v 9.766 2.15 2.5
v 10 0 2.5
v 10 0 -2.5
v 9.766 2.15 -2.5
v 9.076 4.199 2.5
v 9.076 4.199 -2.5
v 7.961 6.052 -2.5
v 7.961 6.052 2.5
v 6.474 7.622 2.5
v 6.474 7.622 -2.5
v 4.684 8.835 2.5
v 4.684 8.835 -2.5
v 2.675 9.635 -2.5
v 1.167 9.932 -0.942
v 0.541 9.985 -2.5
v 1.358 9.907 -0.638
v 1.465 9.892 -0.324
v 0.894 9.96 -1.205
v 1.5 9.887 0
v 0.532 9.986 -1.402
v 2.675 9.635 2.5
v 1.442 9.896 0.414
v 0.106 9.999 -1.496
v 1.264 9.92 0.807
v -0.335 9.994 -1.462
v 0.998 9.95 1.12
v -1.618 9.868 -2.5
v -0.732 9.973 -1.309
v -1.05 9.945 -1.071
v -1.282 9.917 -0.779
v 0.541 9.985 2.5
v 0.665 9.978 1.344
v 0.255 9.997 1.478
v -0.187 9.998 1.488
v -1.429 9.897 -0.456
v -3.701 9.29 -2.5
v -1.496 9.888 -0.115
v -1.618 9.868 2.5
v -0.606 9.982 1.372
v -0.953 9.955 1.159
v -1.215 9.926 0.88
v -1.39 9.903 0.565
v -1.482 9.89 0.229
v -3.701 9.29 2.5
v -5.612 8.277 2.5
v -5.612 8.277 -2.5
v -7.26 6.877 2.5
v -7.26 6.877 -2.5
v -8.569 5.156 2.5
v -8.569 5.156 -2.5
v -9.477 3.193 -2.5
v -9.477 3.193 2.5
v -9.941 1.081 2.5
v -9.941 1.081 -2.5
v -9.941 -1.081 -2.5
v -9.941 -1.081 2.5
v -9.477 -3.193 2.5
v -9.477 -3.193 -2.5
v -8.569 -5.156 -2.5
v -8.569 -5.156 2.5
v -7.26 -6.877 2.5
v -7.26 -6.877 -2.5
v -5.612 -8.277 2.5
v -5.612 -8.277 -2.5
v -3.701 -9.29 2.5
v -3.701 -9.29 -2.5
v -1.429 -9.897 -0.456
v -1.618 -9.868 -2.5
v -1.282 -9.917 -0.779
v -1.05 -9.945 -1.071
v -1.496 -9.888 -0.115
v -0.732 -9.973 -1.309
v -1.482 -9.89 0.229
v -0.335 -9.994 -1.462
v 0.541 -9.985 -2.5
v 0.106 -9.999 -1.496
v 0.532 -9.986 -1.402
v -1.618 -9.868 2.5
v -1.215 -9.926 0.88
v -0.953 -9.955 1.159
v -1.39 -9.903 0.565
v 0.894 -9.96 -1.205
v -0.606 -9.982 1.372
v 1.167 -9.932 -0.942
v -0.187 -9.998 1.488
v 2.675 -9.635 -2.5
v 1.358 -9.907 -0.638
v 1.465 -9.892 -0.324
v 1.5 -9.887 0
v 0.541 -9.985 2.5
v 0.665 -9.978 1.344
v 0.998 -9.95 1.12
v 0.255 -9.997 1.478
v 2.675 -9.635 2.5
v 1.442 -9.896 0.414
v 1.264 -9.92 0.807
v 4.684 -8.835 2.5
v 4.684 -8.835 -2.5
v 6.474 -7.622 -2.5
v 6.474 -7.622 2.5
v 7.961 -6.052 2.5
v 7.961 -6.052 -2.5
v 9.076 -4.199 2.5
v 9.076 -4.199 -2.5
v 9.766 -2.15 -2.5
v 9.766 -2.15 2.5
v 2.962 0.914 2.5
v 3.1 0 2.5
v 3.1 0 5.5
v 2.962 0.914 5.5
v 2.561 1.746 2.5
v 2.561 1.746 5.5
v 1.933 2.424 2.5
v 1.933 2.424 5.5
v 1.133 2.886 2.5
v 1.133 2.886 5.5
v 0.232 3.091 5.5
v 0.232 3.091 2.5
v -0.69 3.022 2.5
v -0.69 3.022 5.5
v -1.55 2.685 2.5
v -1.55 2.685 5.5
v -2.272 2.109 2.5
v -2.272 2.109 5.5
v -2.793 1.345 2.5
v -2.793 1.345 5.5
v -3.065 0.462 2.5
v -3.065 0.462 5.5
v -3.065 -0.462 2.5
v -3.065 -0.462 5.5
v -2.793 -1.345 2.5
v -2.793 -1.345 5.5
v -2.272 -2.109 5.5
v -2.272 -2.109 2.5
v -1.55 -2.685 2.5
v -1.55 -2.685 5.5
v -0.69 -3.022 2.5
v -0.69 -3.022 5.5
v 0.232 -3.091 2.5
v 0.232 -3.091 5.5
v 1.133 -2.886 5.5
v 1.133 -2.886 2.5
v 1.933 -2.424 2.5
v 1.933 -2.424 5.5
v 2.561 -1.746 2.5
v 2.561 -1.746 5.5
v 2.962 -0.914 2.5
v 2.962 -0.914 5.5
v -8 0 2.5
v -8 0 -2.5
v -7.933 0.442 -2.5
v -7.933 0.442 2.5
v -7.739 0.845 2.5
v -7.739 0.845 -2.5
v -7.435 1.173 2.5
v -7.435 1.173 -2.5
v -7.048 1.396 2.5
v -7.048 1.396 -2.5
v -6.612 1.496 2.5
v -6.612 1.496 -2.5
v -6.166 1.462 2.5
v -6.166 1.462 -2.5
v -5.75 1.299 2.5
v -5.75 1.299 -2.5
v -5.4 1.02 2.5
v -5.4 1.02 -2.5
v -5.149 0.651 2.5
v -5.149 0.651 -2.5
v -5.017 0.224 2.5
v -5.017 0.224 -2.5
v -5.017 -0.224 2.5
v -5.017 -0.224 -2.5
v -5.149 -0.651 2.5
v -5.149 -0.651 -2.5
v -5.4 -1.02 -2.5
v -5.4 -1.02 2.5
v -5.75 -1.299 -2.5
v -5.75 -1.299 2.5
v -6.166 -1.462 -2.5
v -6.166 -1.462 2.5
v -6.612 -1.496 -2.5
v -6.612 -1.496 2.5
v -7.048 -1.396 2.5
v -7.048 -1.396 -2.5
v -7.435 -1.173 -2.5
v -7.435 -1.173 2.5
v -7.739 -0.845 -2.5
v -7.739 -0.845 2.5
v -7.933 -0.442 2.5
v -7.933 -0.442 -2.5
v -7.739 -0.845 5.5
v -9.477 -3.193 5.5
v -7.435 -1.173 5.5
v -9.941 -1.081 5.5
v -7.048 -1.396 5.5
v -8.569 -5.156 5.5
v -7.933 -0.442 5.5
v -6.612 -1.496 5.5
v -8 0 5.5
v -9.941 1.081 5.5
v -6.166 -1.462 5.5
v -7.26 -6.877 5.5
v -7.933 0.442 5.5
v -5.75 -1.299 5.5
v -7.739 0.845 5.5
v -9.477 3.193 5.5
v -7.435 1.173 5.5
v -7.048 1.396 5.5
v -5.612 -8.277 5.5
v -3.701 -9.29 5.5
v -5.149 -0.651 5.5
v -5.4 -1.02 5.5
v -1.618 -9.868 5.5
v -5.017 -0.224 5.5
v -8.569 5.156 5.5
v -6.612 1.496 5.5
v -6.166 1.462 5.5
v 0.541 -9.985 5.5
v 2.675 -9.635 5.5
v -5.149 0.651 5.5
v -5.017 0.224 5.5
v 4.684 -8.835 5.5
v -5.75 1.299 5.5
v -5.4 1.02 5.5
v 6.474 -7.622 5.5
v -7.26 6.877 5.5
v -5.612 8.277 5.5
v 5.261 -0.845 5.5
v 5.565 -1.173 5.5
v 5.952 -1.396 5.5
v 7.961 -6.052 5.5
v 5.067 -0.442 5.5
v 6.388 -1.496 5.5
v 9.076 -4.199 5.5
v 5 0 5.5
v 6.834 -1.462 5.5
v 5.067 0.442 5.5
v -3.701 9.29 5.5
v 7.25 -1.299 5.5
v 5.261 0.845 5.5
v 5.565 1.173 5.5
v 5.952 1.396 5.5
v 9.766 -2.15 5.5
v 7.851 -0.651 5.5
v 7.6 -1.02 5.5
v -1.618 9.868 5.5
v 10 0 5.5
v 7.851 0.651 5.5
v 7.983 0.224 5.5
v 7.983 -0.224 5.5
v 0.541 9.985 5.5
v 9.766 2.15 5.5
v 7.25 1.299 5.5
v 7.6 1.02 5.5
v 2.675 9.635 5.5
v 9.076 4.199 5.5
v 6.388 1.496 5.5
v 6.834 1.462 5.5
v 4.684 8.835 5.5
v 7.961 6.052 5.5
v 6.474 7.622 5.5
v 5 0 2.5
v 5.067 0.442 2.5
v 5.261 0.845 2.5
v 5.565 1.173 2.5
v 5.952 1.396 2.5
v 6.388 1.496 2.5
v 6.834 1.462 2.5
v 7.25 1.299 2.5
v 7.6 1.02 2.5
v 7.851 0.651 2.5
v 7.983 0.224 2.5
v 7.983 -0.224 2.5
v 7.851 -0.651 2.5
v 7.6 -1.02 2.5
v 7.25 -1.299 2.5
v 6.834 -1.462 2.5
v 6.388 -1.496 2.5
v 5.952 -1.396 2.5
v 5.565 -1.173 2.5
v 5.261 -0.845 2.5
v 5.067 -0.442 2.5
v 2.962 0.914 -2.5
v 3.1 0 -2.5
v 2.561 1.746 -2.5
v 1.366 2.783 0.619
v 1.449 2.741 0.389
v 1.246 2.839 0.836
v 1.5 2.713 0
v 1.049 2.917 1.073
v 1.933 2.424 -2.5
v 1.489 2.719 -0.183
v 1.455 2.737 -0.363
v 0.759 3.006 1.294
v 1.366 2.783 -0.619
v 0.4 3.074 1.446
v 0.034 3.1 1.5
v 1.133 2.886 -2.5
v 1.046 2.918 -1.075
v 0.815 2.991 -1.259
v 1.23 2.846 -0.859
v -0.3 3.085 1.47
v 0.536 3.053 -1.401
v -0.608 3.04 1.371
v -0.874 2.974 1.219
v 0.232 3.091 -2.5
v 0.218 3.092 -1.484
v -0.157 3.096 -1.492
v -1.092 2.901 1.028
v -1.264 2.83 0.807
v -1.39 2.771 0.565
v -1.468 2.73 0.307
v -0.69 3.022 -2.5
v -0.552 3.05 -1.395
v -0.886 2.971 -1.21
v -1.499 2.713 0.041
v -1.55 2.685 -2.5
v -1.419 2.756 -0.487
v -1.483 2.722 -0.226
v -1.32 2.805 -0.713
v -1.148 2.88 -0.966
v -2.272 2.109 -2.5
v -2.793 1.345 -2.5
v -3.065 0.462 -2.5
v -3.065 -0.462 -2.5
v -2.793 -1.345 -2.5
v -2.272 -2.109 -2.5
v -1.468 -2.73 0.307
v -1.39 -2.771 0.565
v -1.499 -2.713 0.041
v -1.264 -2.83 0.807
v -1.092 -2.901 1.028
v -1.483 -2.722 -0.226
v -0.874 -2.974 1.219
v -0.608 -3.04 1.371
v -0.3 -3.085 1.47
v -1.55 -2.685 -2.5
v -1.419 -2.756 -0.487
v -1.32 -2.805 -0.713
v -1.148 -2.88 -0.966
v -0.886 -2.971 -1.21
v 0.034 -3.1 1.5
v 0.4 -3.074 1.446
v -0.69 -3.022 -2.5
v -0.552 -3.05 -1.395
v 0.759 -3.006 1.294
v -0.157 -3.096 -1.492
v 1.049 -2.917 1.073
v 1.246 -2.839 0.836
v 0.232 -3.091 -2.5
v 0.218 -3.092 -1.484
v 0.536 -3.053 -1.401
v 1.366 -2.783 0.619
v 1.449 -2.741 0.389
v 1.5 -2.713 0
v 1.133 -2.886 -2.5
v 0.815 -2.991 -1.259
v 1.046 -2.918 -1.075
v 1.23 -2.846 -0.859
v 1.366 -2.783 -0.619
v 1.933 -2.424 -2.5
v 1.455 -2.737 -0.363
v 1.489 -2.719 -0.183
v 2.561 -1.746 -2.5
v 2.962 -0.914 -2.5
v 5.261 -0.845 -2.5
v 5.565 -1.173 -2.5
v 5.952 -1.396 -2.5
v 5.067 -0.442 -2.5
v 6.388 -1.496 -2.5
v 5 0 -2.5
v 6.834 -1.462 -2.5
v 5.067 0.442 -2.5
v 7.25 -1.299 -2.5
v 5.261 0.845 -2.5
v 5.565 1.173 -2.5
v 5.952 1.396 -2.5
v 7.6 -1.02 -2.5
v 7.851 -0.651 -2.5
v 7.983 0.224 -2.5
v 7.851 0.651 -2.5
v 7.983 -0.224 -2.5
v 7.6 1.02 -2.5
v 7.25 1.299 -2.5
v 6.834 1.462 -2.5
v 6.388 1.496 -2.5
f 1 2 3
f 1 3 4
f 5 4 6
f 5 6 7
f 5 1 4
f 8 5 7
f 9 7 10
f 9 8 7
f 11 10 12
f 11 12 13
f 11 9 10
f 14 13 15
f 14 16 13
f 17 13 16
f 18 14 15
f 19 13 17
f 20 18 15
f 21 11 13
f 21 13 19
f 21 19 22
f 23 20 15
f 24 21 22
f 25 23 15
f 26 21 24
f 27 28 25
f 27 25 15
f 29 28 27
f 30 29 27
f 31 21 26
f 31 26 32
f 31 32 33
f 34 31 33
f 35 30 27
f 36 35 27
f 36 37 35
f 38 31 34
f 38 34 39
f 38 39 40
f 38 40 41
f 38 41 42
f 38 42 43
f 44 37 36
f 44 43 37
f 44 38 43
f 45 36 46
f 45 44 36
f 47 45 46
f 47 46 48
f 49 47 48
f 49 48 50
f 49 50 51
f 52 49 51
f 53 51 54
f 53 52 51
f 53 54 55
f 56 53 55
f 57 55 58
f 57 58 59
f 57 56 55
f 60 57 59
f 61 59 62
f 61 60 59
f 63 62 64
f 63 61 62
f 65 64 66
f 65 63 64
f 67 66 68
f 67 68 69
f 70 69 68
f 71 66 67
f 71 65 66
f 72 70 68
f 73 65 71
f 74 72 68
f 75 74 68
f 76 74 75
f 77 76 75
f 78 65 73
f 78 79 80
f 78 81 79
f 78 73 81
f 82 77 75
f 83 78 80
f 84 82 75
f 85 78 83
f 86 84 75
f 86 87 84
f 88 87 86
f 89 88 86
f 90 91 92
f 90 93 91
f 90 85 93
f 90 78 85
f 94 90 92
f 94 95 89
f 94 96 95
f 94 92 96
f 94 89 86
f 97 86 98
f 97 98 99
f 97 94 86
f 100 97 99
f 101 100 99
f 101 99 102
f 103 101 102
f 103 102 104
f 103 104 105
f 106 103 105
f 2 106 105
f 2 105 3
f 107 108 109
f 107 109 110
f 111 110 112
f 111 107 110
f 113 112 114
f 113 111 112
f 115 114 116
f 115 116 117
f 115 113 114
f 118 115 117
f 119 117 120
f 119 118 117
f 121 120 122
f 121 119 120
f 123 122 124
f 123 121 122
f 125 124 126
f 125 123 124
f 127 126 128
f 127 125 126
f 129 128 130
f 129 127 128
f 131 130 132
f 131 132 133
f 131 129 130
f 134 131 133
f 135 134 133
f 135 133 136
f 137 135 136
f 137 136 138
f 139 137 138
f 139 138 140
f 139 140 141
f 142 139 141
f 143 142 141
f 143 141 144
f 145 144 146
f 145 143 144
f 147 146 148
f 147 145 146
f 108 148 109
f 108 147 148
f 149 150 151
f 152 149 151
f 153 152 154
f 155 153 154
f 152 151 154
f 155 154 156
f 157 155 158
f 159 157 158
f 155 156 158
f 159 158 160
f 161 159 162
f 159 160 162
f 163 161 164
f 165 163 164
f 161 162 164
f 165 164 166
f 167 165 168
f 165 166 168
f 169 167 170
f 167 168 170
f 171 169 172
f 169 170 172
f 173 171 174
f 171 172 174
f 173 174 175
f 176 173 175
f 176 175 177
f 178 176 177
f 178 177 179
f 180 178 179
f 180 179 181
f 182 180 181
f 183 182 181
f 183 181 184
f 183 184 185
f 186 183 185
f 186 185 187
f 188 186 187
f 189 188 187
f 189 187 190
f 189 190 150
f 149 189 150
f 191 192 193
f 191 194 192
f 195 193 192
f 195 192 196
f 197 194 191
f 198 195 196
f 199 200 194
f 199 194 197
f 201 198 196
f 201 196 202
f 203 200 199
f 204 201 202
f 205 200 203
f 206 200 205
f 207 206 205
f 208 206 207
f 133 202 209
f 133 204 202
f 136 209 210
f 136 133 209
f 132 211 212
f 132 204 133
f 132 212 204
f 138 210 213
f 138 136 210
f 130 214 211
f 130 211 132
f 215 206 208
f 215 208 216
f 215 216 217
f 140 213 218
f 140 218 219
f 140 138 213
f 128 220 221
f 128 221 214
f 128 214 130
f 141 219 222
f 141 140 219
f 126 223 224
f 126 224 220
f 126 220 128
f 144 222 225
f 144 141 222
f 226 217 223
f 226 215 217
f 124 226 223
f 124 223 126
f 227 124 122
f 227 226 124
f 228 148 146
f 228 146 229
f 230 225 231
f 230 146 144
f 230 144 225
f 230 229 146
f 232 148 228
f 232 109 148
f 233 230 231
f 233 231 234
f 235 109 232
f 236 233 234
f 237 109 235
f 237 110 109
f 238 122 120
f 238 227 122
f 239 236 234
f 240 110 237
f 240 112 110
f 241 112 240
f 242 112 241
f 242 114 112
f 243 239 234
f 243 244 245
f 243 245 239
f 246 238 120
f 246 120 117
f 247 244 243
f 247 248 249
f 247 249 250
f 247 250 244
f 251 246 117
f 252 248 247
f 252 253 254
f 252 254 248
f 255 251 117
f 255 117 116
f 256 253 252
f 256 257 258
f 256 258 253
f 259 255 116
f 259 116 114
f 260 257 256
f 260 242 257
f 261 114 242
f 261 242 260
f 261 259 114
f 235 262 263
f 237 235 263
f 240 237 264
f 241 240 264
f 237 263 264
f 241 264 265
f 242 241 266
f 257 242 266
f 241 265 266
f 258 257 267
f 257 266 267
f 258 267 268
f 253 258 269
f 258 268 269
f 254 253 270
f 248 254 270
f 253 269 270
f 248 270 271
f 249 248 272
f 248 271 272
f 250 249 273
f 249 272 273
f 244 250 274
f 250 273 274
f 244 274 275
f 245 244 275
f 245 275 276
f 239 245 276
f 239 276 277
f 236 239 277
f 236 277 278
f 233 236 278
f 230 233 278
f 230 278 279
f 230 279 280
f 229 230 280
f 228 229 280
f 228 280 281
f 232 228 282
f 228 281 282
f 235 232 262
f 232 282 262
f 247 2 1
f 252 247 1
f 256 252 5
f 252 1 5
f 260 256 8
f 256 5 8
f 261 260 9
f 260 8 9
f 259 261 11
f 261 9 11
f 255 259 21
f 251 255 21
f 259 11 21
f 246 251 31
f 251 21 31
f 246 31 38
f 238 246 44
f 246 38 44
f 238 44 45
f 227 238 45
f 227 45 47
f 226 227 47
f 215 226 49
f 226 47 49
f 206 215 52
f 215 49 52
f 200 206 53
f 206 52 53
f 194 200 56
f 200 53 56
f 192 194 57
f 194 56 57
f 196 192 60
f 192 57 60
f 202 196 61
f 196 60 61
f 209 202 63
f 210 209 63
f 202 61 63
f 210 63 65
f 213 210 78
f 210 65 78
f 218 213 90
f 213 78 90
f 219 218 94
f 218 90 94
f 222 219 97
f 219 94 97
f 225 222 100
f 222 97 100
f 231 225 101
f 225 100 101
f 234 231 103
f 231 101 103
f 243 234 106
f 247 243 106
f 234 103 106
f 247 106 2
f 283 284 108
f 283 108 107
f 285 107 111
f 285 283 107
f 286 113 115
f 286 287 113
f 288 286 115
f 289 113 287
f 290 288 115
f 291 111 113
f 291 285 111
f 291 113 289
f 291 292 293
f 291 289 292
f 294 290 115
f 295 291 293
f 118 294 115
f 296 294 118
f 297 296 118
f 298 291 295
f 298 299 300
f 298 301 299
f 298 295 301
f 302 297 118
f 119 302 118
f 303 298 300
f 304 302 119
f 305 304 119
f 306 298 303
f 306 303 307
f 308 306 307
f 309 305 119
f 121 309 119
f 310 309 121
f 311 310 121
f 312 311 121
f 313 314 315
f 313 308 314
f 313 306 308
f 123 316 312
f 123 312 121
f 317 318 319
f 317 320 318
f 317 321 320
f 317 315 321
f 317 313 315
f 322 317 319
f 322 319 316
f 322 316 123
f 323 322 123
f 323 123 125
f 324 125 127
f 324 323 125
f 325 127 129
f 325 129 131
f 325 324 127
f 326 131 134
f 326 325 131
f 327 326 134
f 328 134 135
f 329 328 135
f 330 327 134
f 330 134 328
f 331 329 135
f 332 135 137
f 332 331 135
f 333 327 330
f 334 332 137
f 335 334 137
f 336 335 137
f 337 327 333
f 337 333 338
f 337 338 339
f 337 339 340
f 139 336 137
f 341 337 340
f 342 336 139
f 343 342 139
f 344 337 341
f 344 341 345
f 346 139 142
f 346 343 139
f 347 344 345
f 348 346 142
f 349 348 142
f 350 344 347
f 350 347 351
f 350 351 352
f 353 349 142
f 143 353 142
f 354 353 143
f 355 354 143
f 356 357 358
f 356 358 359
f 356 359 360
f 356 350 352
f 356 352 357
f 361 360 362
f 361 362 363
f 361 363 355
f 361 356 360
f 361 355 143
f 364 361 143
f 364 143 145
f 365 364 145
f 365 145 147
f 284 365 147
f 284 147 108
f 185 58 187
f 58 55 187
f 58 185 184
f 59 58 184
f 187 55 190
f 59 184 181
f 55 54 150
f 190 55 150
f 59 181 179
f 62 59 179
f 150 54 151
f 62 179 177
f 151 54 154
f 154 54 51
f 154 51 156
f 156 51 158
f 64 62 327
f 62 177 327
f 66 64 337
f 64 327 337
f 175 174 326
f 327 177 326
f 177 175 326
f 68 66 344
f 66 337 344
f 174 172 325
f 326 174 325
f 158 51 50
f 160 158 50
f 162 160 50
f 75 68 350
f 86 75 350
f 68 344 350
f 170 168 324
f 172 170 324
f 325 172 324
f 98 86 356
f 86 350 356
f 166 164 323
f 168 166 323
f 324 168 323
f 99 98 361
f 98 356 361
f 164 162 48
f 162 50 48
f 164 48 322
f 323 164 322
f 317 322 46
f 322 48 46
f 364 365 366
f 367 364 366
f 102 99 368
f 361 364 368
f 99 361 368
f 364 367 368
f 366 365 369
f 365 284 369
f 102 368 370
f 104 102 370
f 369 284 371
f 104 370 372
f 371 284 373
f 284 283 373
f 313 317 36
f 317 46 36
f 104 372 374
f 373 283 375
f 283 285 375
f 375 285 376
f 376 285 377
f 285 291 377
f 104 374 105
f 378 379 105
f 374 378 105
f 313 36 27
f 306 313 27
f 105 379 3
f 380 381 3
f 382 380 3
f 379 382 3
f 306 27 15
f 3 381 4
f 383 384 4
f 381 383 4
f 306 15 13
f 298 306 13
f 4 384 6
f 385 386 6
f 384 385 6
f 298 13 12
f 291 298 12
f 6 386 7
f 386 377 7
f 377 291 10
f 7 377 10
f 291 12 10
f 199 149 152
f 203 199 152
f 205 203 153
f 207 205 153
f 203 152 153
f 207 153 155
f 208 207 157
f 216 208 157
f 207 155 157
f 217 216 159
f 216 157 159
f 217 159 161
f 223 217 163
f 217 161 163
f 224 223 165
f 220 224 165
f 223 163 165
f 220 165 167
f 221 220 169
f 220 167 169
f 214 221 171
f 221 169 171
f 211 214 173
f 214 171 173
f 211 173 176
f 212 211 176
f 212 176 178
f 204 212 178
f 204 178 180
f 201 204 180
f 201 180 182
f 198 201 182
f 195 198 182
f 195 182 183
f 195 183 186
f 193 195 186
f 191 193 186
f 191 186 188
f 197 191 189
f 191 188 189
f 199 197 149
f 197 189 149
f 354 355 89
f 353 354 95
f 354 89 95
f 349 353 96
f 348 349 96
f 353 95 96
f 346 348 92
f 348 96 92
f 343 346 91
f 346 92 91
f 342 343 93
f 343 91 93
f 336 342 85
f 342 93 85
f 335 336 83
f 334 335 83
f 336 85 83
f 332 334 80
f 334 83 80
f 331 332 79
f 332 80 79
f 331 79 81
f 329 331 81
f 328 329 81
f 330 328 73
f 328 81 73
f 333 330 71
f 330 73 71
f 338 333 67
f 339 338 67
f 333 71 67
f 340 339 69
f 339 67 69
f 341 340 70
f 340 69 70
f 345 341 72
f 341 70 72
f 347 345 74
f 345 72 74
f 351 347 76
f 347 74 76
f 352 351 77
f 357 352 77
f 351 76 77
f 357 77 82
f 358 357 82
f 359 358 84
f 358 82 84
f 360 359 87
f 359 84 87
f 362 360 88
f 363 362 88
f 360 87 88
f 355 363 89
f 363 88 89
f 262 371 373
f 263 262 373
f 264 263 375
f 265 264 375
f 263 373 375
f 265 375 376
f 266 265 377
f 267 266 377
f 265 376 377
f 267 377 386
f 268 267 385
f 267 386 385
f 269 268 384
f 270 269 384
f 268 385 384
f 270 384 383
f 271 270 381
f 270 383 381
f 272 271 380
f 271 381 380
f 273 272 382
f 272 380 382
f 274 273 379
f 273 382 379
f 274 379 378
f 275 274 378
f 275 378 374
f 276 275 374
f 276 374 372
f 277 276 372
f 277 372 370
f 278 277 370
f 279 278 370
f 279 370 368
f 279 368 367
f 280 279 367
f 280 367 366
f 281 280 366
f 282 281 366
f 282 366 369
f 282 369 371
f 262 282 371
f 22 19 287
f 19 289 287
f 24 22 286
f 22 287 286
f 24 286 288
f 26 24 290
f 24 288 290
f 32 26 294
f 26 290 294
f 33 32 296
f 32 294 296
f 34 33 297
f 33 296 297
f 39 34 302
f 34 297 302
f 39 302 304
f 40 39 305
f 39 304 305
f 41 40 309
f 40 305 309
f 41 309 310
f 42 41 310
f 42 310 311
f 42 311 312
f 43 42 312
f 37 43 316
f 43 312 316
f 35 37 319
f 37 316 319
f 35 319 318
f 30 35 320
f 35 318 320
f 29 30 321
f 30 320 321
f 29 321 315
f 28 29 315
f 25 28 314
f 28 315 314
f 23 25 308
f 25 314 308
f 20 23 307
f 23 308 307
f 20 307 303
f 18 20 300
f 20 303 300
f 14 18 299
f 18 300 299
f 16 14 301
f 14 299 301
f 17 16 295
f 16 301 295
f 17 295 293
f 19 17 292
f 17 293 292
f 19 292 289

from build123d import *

# Parameters (mm, degrees)
F0_R     = 10
F0_R_2   = 3.1
F1_DEPTH = 2.5
F3_D     = 3
F4_R     = 1.5
F5_DEPTH = 12.5
F6_DEPTH = 3


with BuildPart() as f1:
    # F0 (on Top) → F1 (new body, symmetric)
    with BuildSketch(Plane.XY):
        Circle(F0_R)
        Circle(F0_R_2, mode=Mode.SUBTRACT)
    extrude(amount=F1_DEPTH, both=True)

    # F3 (through all)
    with Locations(Plane.XY.offset(2.5)):
        with Locations((-6.5, 0), (6.5, 0)):
            Hole(F3_D / 2)

    # F4 (on Front) → F5 (cut, symmetric)
    with BuildSketch(Plane.XZ):
        Circle(F4_R)
    extrude(amount=F5_DEPTH, both=True, mode=Mode.SUBTRACT)

    # F6 (add): a face of the model
    f6_faces = [f1.faces().sort_by_distance(p)[0] for p in [
        (-9.7171572875, 0, 2.5),
    ]]
    extrude(f6_faces, amount=F6_DEPTH)


solid = f1.part
